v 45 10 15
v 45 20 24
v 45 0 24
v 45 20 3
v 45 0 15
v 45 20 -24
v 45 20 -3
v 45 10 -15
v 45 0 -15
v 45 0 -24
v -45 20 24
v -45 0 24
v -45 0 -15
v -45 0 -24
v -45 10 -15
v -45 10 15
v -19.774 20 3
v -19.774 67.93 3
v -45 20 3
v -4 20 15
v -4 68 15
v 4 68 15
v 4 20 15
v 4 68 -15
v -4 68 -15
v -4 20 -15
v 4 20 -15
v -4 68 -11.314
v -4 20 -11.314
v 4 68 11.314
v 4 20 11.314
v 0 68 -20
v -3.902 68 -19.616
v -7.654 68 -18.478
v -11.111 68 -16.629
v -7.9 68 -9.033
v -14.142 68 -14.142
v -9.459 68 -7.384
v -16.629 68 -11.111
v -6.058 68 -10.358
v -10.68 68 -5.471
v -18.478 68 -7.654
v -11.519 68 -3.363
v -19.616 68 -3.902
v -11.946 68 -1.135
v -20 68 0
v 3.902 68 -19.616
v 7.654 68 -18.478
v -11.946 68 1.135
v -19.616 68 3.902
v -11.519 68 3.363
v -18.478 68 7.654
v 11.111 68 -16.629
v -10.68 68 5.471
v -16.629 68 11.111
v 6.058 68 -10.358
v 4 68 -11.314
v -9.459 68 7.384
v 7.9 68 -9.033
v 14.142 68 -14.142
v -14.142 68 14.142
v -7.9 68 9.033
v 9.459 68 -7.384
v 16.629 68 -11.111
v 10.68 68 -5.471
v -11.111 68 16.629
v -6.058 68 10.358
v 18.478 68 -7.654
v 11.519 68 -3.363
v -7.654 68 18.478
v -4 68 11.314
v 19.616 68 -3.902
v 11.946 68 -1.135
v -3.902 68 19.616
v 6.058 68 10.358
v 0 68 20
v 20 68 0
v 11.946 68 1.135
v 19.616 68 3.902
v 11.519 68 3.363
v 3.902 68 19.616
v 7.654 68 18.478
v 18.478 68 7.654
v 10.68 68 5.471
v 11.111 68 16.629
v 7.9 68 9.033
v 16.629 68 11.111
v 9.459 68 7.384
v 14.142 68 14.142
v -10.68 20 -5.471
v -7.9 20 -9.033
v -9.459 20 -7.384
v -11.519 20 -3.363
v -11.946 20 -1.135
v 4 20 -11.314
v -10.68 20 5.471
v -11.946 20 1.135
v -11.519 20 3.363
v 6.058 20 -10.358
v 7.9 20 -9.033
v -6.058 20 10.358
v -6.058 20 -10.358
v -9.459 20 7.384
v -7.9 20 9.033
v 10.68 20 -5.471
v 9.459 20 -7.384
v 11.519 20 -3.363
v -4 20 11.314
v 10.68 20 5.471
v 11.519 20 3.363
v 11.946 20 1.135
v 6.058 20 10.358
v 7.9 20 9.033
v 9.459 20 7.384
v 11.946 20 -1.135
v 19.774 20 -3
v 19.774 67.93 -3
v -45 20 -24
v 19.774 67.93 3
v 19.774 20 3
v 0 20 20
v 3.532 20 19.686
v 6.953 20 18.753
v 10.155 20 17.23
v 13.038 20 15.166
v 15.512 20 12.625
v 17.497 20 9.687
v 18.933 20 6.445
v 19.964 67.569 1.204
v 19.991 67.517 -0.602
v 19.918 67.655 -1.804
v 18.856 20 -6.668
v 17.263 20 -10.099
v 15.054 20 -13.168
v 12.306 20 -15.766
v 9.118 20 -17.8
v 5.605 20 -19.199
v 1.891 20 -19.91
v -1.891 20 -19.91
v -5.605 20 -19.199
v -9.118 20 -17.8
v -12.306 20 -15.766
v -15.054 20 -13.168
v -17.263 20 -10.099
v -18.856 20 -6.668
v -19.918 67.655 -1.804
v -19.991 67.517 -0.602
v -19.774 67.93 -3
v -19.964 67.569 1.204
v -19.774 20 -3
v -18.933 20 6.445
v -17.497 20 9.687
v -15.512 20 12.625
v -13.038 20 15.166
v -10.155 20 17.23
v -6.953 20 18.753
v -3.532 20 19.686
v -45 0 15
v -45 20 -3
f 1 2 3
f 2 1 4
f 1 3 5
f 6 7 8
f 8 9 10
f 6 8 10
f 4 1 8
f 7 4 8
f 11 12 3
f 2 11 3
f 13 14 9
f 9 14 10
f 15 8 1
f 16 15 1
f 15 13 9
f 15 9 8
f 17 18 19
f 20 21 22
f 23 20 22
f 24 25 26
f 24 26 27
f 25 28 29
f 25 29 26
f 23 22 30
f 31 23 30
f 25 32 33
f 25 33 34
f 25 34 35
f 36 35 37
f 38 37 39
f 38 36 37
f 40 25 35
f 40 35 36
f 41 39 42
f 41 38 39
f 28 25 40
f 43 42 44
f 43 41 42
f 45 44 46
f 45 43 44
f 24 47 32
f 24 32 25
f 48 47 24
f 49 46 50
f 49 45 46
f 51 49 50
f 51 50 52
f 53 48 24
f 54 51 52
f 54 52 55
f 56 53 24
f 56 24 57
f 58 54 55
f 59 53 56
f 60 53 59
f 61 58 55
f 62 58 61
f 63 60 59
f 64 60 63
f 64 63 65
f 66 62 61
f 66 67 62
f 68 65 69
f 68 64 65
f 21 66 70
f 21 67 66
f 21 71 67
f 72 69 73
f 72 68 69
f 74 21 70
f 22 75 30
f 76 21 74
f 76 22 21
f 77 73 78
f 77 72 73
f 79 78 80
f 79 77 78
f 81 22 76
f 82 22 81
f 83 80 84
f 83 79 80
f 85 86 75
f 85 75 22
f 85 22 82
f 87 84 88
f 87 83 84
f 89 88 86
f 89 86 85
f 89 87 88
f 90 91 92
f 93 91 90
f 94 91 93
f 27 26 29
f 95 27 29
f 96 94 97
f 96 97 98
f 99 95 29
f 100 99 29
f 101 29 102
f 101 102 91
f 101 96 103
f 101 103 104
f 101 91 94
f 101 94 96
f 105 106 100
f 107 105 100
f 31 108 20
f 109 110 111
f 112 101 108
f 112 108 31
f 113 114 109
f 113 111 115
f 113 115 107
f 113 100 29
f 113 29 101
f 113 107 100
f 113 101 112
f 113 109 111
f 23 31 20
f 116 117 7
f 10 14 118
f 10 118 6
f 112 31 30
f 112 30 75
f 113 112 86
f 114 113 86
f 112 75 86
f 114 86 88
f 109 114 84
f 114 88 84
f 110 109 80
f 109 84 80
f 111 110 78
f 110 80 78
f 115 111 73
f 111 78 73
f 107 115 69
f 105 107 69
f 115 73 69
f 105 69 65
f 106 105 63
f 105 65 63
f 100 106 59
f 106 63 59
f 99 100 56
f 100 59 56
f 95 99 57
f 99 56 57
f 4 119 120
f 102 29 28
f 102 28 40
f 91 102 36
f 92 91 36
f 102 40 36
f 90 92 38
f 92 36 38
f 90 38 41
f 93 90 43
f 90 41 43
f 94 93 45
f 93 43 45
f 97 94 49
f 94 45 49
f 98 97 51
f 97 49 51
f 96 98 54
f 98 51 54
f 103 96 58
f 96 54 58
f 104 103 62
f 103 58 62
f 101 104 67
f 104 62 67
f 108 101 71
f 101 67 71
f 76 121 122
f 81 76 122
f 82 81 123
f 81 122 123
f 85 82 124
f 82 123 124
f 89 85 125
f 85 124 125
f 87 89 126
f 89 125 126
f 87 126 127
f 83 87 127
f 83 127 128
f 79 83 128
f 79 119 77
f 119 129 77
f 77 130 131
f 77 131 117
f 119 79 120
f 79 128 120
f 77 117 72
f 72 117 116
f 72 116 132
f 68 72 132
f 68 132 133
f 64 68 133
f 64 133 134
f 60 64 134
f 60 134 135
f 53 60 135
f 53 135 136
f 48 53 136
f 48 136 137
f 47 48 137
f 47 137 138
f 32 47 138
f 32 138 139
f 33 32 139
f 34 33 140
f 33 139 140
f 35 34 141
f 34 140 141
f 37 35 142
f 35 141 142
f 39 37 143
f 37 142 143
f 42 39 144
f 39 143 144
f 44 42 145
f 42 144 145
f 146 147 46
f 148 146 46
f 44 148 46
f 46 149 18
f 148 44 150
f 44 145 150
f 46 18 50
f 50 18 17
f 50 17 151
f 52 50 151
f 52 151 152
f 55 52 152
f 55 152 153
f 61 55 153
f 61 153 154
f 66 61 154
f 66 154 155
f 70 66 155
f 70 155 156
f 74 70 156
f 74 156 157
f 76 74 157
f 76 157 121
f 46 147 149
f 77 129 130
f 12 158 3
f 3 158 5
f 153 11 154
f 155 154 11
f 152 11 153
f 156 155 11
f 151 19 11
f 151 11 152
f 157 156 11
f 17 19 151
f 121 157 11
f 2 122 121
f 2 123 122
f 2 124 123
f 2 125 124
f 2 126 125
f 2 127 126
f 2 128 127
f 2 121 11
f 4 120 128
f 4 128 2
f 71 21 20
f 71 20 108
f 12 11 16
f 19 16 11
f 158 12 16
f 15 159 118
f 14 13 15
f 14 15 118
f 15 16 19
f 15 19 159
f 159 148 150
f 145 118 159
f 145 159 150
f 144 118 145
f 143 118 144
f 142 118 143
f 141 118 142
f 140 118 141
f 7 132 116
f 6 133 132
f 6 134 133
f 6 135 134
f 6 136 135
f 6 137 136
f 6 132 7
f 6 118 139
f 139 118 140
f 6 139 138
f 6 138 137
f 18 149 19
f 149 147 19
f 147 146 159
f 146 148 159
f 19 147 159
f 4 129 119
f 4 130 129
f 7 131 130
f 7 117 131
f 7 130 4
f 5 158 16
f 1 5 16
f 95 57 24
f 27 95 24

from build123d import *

# Parameters (mm, degrees)
SKETCH1_W               = 90
SKETCH1_H               = 48
BOSS_EXTRUDE1_DEPTH     = 20
SKETCH2_R               = 20
BOSS_EXTRUDE2_DEPTH     = 48
SKETCH3_R               = 12
CUT_EXTRUDE1_DEPTH      = 48
SKETCH4_W               = 8
SKETCH4_H               = 30
CUT_EXTRUDE2_DEPTH      = 48
SKETCH5_W               = 30
SKETCH5_H               = 10
CUT_EXTRUDE4_DEPTH      = 116.325625947
CUT_EXTRUDE4_DEPTH_BACK = 116.325625947
RIB5_REACH              = 87
SKETCH7_WALL_W          = 225.677276384
SKETCH7_WALL_H          = 6


with BuildPart() as part:
    # Sketch1 → Boss-Extrude1 (new body)
    with BuildSketch(Plane(origin=(0, 0, 0), x_dir=(1, 0, 0), z_dir=(0, 1, 0))):
        Rectangle(SKETCH1_W, SKETCH1_H)
    extrude(amount=BOSS_EXTRUDE1_DEPTH)

    # Sketch2 → Boss-Extrude2 (add)
    with BuildSketch(Plane(origin=(0, 20, 0), x_dir=(1, 0, 0), z_dir=(0, 1, 0))):
        with Locations(Location((0, 0, 0), (0, 0, 270))):
            Circle(SKETCH2_R)
    extrude(amount=BOSS_EXTRUDE2_DEPTH)

    # Sketch3 → Cut-Extrude1 (cut)
    with BuildSketch(Plane(origin=(0, 68, 0), x_dir=(1, 0, 0), z_dir=(0, 1, 0))):
        with Locations(Location((0, 0, 0), (0, 0, 270))):
            Circle(SKETCH3_R)
    extrude(amount=-CUT_EXTRUDE1_DEPTH, mode=Mode.SUBTRACT)

    # Sketch4 → Cut-Extrude2 (cut)
    with BuildSketch(Plane(origin=(0, 68, 0), x_dir=(1, 0, 0), z_dir=(0, 1, 0))):
        Rectangle(SKETCH4_W, SKETCH4_H)
    extrude(amount=-CUT_EXTRUDE2_DEPTH, mode=Mode.SUBTRACT)

    # Sketch5 → Cut-Extrude4 (cut, two sides)
    with BuildSketch(Plane.ZY.offset(45)) as cut_extrude4_sk:
        with Locations((0, 5)):
            Rectangle(SKETCH5_W, SKETCH5_H)
    extrude(amount=CUT_EXTRUDE4_DEPTH, mode=Mode.SUBTRACT)
    extrude(cut_extrude4_sk.sketch, amount=-CUT_EXTRUDE4_DEPTH_BACK, mode=Mode.SUBTRACT)

    # Sketch7 wall → Rib5 (add, up to next)
    with BuildSketch(Plane(origin=(32.5, 43.75, 0), x_dir=(0.465746432833, -0.884918222382, 0), z_dir=(0.884918222382, 0.465746432833, 0)), mode=Mode.PRIVATE) as rib5_sk1:
        Rectangle(SKETCH7_WALL_W, SKETCH7_WALL_H)
    rib5_tool1 = extrude(rib5_sk1.sketch, amount=-RIB5_REACH, mode=Mode.PRIVATE) - part.part
    add(rib5_tool1.solids().sort_by_distance((32.5, 43.75, 0))[0])

    # Mirror1: part across plane


with BuildPart() as part_1:
    add(part.part)
    add(part.part.mirror(Plane(origin=(0, 0, 0), x_dir=(0, 0, 1), z_dir=(1, 0, 0))))


solid = part_1.part
